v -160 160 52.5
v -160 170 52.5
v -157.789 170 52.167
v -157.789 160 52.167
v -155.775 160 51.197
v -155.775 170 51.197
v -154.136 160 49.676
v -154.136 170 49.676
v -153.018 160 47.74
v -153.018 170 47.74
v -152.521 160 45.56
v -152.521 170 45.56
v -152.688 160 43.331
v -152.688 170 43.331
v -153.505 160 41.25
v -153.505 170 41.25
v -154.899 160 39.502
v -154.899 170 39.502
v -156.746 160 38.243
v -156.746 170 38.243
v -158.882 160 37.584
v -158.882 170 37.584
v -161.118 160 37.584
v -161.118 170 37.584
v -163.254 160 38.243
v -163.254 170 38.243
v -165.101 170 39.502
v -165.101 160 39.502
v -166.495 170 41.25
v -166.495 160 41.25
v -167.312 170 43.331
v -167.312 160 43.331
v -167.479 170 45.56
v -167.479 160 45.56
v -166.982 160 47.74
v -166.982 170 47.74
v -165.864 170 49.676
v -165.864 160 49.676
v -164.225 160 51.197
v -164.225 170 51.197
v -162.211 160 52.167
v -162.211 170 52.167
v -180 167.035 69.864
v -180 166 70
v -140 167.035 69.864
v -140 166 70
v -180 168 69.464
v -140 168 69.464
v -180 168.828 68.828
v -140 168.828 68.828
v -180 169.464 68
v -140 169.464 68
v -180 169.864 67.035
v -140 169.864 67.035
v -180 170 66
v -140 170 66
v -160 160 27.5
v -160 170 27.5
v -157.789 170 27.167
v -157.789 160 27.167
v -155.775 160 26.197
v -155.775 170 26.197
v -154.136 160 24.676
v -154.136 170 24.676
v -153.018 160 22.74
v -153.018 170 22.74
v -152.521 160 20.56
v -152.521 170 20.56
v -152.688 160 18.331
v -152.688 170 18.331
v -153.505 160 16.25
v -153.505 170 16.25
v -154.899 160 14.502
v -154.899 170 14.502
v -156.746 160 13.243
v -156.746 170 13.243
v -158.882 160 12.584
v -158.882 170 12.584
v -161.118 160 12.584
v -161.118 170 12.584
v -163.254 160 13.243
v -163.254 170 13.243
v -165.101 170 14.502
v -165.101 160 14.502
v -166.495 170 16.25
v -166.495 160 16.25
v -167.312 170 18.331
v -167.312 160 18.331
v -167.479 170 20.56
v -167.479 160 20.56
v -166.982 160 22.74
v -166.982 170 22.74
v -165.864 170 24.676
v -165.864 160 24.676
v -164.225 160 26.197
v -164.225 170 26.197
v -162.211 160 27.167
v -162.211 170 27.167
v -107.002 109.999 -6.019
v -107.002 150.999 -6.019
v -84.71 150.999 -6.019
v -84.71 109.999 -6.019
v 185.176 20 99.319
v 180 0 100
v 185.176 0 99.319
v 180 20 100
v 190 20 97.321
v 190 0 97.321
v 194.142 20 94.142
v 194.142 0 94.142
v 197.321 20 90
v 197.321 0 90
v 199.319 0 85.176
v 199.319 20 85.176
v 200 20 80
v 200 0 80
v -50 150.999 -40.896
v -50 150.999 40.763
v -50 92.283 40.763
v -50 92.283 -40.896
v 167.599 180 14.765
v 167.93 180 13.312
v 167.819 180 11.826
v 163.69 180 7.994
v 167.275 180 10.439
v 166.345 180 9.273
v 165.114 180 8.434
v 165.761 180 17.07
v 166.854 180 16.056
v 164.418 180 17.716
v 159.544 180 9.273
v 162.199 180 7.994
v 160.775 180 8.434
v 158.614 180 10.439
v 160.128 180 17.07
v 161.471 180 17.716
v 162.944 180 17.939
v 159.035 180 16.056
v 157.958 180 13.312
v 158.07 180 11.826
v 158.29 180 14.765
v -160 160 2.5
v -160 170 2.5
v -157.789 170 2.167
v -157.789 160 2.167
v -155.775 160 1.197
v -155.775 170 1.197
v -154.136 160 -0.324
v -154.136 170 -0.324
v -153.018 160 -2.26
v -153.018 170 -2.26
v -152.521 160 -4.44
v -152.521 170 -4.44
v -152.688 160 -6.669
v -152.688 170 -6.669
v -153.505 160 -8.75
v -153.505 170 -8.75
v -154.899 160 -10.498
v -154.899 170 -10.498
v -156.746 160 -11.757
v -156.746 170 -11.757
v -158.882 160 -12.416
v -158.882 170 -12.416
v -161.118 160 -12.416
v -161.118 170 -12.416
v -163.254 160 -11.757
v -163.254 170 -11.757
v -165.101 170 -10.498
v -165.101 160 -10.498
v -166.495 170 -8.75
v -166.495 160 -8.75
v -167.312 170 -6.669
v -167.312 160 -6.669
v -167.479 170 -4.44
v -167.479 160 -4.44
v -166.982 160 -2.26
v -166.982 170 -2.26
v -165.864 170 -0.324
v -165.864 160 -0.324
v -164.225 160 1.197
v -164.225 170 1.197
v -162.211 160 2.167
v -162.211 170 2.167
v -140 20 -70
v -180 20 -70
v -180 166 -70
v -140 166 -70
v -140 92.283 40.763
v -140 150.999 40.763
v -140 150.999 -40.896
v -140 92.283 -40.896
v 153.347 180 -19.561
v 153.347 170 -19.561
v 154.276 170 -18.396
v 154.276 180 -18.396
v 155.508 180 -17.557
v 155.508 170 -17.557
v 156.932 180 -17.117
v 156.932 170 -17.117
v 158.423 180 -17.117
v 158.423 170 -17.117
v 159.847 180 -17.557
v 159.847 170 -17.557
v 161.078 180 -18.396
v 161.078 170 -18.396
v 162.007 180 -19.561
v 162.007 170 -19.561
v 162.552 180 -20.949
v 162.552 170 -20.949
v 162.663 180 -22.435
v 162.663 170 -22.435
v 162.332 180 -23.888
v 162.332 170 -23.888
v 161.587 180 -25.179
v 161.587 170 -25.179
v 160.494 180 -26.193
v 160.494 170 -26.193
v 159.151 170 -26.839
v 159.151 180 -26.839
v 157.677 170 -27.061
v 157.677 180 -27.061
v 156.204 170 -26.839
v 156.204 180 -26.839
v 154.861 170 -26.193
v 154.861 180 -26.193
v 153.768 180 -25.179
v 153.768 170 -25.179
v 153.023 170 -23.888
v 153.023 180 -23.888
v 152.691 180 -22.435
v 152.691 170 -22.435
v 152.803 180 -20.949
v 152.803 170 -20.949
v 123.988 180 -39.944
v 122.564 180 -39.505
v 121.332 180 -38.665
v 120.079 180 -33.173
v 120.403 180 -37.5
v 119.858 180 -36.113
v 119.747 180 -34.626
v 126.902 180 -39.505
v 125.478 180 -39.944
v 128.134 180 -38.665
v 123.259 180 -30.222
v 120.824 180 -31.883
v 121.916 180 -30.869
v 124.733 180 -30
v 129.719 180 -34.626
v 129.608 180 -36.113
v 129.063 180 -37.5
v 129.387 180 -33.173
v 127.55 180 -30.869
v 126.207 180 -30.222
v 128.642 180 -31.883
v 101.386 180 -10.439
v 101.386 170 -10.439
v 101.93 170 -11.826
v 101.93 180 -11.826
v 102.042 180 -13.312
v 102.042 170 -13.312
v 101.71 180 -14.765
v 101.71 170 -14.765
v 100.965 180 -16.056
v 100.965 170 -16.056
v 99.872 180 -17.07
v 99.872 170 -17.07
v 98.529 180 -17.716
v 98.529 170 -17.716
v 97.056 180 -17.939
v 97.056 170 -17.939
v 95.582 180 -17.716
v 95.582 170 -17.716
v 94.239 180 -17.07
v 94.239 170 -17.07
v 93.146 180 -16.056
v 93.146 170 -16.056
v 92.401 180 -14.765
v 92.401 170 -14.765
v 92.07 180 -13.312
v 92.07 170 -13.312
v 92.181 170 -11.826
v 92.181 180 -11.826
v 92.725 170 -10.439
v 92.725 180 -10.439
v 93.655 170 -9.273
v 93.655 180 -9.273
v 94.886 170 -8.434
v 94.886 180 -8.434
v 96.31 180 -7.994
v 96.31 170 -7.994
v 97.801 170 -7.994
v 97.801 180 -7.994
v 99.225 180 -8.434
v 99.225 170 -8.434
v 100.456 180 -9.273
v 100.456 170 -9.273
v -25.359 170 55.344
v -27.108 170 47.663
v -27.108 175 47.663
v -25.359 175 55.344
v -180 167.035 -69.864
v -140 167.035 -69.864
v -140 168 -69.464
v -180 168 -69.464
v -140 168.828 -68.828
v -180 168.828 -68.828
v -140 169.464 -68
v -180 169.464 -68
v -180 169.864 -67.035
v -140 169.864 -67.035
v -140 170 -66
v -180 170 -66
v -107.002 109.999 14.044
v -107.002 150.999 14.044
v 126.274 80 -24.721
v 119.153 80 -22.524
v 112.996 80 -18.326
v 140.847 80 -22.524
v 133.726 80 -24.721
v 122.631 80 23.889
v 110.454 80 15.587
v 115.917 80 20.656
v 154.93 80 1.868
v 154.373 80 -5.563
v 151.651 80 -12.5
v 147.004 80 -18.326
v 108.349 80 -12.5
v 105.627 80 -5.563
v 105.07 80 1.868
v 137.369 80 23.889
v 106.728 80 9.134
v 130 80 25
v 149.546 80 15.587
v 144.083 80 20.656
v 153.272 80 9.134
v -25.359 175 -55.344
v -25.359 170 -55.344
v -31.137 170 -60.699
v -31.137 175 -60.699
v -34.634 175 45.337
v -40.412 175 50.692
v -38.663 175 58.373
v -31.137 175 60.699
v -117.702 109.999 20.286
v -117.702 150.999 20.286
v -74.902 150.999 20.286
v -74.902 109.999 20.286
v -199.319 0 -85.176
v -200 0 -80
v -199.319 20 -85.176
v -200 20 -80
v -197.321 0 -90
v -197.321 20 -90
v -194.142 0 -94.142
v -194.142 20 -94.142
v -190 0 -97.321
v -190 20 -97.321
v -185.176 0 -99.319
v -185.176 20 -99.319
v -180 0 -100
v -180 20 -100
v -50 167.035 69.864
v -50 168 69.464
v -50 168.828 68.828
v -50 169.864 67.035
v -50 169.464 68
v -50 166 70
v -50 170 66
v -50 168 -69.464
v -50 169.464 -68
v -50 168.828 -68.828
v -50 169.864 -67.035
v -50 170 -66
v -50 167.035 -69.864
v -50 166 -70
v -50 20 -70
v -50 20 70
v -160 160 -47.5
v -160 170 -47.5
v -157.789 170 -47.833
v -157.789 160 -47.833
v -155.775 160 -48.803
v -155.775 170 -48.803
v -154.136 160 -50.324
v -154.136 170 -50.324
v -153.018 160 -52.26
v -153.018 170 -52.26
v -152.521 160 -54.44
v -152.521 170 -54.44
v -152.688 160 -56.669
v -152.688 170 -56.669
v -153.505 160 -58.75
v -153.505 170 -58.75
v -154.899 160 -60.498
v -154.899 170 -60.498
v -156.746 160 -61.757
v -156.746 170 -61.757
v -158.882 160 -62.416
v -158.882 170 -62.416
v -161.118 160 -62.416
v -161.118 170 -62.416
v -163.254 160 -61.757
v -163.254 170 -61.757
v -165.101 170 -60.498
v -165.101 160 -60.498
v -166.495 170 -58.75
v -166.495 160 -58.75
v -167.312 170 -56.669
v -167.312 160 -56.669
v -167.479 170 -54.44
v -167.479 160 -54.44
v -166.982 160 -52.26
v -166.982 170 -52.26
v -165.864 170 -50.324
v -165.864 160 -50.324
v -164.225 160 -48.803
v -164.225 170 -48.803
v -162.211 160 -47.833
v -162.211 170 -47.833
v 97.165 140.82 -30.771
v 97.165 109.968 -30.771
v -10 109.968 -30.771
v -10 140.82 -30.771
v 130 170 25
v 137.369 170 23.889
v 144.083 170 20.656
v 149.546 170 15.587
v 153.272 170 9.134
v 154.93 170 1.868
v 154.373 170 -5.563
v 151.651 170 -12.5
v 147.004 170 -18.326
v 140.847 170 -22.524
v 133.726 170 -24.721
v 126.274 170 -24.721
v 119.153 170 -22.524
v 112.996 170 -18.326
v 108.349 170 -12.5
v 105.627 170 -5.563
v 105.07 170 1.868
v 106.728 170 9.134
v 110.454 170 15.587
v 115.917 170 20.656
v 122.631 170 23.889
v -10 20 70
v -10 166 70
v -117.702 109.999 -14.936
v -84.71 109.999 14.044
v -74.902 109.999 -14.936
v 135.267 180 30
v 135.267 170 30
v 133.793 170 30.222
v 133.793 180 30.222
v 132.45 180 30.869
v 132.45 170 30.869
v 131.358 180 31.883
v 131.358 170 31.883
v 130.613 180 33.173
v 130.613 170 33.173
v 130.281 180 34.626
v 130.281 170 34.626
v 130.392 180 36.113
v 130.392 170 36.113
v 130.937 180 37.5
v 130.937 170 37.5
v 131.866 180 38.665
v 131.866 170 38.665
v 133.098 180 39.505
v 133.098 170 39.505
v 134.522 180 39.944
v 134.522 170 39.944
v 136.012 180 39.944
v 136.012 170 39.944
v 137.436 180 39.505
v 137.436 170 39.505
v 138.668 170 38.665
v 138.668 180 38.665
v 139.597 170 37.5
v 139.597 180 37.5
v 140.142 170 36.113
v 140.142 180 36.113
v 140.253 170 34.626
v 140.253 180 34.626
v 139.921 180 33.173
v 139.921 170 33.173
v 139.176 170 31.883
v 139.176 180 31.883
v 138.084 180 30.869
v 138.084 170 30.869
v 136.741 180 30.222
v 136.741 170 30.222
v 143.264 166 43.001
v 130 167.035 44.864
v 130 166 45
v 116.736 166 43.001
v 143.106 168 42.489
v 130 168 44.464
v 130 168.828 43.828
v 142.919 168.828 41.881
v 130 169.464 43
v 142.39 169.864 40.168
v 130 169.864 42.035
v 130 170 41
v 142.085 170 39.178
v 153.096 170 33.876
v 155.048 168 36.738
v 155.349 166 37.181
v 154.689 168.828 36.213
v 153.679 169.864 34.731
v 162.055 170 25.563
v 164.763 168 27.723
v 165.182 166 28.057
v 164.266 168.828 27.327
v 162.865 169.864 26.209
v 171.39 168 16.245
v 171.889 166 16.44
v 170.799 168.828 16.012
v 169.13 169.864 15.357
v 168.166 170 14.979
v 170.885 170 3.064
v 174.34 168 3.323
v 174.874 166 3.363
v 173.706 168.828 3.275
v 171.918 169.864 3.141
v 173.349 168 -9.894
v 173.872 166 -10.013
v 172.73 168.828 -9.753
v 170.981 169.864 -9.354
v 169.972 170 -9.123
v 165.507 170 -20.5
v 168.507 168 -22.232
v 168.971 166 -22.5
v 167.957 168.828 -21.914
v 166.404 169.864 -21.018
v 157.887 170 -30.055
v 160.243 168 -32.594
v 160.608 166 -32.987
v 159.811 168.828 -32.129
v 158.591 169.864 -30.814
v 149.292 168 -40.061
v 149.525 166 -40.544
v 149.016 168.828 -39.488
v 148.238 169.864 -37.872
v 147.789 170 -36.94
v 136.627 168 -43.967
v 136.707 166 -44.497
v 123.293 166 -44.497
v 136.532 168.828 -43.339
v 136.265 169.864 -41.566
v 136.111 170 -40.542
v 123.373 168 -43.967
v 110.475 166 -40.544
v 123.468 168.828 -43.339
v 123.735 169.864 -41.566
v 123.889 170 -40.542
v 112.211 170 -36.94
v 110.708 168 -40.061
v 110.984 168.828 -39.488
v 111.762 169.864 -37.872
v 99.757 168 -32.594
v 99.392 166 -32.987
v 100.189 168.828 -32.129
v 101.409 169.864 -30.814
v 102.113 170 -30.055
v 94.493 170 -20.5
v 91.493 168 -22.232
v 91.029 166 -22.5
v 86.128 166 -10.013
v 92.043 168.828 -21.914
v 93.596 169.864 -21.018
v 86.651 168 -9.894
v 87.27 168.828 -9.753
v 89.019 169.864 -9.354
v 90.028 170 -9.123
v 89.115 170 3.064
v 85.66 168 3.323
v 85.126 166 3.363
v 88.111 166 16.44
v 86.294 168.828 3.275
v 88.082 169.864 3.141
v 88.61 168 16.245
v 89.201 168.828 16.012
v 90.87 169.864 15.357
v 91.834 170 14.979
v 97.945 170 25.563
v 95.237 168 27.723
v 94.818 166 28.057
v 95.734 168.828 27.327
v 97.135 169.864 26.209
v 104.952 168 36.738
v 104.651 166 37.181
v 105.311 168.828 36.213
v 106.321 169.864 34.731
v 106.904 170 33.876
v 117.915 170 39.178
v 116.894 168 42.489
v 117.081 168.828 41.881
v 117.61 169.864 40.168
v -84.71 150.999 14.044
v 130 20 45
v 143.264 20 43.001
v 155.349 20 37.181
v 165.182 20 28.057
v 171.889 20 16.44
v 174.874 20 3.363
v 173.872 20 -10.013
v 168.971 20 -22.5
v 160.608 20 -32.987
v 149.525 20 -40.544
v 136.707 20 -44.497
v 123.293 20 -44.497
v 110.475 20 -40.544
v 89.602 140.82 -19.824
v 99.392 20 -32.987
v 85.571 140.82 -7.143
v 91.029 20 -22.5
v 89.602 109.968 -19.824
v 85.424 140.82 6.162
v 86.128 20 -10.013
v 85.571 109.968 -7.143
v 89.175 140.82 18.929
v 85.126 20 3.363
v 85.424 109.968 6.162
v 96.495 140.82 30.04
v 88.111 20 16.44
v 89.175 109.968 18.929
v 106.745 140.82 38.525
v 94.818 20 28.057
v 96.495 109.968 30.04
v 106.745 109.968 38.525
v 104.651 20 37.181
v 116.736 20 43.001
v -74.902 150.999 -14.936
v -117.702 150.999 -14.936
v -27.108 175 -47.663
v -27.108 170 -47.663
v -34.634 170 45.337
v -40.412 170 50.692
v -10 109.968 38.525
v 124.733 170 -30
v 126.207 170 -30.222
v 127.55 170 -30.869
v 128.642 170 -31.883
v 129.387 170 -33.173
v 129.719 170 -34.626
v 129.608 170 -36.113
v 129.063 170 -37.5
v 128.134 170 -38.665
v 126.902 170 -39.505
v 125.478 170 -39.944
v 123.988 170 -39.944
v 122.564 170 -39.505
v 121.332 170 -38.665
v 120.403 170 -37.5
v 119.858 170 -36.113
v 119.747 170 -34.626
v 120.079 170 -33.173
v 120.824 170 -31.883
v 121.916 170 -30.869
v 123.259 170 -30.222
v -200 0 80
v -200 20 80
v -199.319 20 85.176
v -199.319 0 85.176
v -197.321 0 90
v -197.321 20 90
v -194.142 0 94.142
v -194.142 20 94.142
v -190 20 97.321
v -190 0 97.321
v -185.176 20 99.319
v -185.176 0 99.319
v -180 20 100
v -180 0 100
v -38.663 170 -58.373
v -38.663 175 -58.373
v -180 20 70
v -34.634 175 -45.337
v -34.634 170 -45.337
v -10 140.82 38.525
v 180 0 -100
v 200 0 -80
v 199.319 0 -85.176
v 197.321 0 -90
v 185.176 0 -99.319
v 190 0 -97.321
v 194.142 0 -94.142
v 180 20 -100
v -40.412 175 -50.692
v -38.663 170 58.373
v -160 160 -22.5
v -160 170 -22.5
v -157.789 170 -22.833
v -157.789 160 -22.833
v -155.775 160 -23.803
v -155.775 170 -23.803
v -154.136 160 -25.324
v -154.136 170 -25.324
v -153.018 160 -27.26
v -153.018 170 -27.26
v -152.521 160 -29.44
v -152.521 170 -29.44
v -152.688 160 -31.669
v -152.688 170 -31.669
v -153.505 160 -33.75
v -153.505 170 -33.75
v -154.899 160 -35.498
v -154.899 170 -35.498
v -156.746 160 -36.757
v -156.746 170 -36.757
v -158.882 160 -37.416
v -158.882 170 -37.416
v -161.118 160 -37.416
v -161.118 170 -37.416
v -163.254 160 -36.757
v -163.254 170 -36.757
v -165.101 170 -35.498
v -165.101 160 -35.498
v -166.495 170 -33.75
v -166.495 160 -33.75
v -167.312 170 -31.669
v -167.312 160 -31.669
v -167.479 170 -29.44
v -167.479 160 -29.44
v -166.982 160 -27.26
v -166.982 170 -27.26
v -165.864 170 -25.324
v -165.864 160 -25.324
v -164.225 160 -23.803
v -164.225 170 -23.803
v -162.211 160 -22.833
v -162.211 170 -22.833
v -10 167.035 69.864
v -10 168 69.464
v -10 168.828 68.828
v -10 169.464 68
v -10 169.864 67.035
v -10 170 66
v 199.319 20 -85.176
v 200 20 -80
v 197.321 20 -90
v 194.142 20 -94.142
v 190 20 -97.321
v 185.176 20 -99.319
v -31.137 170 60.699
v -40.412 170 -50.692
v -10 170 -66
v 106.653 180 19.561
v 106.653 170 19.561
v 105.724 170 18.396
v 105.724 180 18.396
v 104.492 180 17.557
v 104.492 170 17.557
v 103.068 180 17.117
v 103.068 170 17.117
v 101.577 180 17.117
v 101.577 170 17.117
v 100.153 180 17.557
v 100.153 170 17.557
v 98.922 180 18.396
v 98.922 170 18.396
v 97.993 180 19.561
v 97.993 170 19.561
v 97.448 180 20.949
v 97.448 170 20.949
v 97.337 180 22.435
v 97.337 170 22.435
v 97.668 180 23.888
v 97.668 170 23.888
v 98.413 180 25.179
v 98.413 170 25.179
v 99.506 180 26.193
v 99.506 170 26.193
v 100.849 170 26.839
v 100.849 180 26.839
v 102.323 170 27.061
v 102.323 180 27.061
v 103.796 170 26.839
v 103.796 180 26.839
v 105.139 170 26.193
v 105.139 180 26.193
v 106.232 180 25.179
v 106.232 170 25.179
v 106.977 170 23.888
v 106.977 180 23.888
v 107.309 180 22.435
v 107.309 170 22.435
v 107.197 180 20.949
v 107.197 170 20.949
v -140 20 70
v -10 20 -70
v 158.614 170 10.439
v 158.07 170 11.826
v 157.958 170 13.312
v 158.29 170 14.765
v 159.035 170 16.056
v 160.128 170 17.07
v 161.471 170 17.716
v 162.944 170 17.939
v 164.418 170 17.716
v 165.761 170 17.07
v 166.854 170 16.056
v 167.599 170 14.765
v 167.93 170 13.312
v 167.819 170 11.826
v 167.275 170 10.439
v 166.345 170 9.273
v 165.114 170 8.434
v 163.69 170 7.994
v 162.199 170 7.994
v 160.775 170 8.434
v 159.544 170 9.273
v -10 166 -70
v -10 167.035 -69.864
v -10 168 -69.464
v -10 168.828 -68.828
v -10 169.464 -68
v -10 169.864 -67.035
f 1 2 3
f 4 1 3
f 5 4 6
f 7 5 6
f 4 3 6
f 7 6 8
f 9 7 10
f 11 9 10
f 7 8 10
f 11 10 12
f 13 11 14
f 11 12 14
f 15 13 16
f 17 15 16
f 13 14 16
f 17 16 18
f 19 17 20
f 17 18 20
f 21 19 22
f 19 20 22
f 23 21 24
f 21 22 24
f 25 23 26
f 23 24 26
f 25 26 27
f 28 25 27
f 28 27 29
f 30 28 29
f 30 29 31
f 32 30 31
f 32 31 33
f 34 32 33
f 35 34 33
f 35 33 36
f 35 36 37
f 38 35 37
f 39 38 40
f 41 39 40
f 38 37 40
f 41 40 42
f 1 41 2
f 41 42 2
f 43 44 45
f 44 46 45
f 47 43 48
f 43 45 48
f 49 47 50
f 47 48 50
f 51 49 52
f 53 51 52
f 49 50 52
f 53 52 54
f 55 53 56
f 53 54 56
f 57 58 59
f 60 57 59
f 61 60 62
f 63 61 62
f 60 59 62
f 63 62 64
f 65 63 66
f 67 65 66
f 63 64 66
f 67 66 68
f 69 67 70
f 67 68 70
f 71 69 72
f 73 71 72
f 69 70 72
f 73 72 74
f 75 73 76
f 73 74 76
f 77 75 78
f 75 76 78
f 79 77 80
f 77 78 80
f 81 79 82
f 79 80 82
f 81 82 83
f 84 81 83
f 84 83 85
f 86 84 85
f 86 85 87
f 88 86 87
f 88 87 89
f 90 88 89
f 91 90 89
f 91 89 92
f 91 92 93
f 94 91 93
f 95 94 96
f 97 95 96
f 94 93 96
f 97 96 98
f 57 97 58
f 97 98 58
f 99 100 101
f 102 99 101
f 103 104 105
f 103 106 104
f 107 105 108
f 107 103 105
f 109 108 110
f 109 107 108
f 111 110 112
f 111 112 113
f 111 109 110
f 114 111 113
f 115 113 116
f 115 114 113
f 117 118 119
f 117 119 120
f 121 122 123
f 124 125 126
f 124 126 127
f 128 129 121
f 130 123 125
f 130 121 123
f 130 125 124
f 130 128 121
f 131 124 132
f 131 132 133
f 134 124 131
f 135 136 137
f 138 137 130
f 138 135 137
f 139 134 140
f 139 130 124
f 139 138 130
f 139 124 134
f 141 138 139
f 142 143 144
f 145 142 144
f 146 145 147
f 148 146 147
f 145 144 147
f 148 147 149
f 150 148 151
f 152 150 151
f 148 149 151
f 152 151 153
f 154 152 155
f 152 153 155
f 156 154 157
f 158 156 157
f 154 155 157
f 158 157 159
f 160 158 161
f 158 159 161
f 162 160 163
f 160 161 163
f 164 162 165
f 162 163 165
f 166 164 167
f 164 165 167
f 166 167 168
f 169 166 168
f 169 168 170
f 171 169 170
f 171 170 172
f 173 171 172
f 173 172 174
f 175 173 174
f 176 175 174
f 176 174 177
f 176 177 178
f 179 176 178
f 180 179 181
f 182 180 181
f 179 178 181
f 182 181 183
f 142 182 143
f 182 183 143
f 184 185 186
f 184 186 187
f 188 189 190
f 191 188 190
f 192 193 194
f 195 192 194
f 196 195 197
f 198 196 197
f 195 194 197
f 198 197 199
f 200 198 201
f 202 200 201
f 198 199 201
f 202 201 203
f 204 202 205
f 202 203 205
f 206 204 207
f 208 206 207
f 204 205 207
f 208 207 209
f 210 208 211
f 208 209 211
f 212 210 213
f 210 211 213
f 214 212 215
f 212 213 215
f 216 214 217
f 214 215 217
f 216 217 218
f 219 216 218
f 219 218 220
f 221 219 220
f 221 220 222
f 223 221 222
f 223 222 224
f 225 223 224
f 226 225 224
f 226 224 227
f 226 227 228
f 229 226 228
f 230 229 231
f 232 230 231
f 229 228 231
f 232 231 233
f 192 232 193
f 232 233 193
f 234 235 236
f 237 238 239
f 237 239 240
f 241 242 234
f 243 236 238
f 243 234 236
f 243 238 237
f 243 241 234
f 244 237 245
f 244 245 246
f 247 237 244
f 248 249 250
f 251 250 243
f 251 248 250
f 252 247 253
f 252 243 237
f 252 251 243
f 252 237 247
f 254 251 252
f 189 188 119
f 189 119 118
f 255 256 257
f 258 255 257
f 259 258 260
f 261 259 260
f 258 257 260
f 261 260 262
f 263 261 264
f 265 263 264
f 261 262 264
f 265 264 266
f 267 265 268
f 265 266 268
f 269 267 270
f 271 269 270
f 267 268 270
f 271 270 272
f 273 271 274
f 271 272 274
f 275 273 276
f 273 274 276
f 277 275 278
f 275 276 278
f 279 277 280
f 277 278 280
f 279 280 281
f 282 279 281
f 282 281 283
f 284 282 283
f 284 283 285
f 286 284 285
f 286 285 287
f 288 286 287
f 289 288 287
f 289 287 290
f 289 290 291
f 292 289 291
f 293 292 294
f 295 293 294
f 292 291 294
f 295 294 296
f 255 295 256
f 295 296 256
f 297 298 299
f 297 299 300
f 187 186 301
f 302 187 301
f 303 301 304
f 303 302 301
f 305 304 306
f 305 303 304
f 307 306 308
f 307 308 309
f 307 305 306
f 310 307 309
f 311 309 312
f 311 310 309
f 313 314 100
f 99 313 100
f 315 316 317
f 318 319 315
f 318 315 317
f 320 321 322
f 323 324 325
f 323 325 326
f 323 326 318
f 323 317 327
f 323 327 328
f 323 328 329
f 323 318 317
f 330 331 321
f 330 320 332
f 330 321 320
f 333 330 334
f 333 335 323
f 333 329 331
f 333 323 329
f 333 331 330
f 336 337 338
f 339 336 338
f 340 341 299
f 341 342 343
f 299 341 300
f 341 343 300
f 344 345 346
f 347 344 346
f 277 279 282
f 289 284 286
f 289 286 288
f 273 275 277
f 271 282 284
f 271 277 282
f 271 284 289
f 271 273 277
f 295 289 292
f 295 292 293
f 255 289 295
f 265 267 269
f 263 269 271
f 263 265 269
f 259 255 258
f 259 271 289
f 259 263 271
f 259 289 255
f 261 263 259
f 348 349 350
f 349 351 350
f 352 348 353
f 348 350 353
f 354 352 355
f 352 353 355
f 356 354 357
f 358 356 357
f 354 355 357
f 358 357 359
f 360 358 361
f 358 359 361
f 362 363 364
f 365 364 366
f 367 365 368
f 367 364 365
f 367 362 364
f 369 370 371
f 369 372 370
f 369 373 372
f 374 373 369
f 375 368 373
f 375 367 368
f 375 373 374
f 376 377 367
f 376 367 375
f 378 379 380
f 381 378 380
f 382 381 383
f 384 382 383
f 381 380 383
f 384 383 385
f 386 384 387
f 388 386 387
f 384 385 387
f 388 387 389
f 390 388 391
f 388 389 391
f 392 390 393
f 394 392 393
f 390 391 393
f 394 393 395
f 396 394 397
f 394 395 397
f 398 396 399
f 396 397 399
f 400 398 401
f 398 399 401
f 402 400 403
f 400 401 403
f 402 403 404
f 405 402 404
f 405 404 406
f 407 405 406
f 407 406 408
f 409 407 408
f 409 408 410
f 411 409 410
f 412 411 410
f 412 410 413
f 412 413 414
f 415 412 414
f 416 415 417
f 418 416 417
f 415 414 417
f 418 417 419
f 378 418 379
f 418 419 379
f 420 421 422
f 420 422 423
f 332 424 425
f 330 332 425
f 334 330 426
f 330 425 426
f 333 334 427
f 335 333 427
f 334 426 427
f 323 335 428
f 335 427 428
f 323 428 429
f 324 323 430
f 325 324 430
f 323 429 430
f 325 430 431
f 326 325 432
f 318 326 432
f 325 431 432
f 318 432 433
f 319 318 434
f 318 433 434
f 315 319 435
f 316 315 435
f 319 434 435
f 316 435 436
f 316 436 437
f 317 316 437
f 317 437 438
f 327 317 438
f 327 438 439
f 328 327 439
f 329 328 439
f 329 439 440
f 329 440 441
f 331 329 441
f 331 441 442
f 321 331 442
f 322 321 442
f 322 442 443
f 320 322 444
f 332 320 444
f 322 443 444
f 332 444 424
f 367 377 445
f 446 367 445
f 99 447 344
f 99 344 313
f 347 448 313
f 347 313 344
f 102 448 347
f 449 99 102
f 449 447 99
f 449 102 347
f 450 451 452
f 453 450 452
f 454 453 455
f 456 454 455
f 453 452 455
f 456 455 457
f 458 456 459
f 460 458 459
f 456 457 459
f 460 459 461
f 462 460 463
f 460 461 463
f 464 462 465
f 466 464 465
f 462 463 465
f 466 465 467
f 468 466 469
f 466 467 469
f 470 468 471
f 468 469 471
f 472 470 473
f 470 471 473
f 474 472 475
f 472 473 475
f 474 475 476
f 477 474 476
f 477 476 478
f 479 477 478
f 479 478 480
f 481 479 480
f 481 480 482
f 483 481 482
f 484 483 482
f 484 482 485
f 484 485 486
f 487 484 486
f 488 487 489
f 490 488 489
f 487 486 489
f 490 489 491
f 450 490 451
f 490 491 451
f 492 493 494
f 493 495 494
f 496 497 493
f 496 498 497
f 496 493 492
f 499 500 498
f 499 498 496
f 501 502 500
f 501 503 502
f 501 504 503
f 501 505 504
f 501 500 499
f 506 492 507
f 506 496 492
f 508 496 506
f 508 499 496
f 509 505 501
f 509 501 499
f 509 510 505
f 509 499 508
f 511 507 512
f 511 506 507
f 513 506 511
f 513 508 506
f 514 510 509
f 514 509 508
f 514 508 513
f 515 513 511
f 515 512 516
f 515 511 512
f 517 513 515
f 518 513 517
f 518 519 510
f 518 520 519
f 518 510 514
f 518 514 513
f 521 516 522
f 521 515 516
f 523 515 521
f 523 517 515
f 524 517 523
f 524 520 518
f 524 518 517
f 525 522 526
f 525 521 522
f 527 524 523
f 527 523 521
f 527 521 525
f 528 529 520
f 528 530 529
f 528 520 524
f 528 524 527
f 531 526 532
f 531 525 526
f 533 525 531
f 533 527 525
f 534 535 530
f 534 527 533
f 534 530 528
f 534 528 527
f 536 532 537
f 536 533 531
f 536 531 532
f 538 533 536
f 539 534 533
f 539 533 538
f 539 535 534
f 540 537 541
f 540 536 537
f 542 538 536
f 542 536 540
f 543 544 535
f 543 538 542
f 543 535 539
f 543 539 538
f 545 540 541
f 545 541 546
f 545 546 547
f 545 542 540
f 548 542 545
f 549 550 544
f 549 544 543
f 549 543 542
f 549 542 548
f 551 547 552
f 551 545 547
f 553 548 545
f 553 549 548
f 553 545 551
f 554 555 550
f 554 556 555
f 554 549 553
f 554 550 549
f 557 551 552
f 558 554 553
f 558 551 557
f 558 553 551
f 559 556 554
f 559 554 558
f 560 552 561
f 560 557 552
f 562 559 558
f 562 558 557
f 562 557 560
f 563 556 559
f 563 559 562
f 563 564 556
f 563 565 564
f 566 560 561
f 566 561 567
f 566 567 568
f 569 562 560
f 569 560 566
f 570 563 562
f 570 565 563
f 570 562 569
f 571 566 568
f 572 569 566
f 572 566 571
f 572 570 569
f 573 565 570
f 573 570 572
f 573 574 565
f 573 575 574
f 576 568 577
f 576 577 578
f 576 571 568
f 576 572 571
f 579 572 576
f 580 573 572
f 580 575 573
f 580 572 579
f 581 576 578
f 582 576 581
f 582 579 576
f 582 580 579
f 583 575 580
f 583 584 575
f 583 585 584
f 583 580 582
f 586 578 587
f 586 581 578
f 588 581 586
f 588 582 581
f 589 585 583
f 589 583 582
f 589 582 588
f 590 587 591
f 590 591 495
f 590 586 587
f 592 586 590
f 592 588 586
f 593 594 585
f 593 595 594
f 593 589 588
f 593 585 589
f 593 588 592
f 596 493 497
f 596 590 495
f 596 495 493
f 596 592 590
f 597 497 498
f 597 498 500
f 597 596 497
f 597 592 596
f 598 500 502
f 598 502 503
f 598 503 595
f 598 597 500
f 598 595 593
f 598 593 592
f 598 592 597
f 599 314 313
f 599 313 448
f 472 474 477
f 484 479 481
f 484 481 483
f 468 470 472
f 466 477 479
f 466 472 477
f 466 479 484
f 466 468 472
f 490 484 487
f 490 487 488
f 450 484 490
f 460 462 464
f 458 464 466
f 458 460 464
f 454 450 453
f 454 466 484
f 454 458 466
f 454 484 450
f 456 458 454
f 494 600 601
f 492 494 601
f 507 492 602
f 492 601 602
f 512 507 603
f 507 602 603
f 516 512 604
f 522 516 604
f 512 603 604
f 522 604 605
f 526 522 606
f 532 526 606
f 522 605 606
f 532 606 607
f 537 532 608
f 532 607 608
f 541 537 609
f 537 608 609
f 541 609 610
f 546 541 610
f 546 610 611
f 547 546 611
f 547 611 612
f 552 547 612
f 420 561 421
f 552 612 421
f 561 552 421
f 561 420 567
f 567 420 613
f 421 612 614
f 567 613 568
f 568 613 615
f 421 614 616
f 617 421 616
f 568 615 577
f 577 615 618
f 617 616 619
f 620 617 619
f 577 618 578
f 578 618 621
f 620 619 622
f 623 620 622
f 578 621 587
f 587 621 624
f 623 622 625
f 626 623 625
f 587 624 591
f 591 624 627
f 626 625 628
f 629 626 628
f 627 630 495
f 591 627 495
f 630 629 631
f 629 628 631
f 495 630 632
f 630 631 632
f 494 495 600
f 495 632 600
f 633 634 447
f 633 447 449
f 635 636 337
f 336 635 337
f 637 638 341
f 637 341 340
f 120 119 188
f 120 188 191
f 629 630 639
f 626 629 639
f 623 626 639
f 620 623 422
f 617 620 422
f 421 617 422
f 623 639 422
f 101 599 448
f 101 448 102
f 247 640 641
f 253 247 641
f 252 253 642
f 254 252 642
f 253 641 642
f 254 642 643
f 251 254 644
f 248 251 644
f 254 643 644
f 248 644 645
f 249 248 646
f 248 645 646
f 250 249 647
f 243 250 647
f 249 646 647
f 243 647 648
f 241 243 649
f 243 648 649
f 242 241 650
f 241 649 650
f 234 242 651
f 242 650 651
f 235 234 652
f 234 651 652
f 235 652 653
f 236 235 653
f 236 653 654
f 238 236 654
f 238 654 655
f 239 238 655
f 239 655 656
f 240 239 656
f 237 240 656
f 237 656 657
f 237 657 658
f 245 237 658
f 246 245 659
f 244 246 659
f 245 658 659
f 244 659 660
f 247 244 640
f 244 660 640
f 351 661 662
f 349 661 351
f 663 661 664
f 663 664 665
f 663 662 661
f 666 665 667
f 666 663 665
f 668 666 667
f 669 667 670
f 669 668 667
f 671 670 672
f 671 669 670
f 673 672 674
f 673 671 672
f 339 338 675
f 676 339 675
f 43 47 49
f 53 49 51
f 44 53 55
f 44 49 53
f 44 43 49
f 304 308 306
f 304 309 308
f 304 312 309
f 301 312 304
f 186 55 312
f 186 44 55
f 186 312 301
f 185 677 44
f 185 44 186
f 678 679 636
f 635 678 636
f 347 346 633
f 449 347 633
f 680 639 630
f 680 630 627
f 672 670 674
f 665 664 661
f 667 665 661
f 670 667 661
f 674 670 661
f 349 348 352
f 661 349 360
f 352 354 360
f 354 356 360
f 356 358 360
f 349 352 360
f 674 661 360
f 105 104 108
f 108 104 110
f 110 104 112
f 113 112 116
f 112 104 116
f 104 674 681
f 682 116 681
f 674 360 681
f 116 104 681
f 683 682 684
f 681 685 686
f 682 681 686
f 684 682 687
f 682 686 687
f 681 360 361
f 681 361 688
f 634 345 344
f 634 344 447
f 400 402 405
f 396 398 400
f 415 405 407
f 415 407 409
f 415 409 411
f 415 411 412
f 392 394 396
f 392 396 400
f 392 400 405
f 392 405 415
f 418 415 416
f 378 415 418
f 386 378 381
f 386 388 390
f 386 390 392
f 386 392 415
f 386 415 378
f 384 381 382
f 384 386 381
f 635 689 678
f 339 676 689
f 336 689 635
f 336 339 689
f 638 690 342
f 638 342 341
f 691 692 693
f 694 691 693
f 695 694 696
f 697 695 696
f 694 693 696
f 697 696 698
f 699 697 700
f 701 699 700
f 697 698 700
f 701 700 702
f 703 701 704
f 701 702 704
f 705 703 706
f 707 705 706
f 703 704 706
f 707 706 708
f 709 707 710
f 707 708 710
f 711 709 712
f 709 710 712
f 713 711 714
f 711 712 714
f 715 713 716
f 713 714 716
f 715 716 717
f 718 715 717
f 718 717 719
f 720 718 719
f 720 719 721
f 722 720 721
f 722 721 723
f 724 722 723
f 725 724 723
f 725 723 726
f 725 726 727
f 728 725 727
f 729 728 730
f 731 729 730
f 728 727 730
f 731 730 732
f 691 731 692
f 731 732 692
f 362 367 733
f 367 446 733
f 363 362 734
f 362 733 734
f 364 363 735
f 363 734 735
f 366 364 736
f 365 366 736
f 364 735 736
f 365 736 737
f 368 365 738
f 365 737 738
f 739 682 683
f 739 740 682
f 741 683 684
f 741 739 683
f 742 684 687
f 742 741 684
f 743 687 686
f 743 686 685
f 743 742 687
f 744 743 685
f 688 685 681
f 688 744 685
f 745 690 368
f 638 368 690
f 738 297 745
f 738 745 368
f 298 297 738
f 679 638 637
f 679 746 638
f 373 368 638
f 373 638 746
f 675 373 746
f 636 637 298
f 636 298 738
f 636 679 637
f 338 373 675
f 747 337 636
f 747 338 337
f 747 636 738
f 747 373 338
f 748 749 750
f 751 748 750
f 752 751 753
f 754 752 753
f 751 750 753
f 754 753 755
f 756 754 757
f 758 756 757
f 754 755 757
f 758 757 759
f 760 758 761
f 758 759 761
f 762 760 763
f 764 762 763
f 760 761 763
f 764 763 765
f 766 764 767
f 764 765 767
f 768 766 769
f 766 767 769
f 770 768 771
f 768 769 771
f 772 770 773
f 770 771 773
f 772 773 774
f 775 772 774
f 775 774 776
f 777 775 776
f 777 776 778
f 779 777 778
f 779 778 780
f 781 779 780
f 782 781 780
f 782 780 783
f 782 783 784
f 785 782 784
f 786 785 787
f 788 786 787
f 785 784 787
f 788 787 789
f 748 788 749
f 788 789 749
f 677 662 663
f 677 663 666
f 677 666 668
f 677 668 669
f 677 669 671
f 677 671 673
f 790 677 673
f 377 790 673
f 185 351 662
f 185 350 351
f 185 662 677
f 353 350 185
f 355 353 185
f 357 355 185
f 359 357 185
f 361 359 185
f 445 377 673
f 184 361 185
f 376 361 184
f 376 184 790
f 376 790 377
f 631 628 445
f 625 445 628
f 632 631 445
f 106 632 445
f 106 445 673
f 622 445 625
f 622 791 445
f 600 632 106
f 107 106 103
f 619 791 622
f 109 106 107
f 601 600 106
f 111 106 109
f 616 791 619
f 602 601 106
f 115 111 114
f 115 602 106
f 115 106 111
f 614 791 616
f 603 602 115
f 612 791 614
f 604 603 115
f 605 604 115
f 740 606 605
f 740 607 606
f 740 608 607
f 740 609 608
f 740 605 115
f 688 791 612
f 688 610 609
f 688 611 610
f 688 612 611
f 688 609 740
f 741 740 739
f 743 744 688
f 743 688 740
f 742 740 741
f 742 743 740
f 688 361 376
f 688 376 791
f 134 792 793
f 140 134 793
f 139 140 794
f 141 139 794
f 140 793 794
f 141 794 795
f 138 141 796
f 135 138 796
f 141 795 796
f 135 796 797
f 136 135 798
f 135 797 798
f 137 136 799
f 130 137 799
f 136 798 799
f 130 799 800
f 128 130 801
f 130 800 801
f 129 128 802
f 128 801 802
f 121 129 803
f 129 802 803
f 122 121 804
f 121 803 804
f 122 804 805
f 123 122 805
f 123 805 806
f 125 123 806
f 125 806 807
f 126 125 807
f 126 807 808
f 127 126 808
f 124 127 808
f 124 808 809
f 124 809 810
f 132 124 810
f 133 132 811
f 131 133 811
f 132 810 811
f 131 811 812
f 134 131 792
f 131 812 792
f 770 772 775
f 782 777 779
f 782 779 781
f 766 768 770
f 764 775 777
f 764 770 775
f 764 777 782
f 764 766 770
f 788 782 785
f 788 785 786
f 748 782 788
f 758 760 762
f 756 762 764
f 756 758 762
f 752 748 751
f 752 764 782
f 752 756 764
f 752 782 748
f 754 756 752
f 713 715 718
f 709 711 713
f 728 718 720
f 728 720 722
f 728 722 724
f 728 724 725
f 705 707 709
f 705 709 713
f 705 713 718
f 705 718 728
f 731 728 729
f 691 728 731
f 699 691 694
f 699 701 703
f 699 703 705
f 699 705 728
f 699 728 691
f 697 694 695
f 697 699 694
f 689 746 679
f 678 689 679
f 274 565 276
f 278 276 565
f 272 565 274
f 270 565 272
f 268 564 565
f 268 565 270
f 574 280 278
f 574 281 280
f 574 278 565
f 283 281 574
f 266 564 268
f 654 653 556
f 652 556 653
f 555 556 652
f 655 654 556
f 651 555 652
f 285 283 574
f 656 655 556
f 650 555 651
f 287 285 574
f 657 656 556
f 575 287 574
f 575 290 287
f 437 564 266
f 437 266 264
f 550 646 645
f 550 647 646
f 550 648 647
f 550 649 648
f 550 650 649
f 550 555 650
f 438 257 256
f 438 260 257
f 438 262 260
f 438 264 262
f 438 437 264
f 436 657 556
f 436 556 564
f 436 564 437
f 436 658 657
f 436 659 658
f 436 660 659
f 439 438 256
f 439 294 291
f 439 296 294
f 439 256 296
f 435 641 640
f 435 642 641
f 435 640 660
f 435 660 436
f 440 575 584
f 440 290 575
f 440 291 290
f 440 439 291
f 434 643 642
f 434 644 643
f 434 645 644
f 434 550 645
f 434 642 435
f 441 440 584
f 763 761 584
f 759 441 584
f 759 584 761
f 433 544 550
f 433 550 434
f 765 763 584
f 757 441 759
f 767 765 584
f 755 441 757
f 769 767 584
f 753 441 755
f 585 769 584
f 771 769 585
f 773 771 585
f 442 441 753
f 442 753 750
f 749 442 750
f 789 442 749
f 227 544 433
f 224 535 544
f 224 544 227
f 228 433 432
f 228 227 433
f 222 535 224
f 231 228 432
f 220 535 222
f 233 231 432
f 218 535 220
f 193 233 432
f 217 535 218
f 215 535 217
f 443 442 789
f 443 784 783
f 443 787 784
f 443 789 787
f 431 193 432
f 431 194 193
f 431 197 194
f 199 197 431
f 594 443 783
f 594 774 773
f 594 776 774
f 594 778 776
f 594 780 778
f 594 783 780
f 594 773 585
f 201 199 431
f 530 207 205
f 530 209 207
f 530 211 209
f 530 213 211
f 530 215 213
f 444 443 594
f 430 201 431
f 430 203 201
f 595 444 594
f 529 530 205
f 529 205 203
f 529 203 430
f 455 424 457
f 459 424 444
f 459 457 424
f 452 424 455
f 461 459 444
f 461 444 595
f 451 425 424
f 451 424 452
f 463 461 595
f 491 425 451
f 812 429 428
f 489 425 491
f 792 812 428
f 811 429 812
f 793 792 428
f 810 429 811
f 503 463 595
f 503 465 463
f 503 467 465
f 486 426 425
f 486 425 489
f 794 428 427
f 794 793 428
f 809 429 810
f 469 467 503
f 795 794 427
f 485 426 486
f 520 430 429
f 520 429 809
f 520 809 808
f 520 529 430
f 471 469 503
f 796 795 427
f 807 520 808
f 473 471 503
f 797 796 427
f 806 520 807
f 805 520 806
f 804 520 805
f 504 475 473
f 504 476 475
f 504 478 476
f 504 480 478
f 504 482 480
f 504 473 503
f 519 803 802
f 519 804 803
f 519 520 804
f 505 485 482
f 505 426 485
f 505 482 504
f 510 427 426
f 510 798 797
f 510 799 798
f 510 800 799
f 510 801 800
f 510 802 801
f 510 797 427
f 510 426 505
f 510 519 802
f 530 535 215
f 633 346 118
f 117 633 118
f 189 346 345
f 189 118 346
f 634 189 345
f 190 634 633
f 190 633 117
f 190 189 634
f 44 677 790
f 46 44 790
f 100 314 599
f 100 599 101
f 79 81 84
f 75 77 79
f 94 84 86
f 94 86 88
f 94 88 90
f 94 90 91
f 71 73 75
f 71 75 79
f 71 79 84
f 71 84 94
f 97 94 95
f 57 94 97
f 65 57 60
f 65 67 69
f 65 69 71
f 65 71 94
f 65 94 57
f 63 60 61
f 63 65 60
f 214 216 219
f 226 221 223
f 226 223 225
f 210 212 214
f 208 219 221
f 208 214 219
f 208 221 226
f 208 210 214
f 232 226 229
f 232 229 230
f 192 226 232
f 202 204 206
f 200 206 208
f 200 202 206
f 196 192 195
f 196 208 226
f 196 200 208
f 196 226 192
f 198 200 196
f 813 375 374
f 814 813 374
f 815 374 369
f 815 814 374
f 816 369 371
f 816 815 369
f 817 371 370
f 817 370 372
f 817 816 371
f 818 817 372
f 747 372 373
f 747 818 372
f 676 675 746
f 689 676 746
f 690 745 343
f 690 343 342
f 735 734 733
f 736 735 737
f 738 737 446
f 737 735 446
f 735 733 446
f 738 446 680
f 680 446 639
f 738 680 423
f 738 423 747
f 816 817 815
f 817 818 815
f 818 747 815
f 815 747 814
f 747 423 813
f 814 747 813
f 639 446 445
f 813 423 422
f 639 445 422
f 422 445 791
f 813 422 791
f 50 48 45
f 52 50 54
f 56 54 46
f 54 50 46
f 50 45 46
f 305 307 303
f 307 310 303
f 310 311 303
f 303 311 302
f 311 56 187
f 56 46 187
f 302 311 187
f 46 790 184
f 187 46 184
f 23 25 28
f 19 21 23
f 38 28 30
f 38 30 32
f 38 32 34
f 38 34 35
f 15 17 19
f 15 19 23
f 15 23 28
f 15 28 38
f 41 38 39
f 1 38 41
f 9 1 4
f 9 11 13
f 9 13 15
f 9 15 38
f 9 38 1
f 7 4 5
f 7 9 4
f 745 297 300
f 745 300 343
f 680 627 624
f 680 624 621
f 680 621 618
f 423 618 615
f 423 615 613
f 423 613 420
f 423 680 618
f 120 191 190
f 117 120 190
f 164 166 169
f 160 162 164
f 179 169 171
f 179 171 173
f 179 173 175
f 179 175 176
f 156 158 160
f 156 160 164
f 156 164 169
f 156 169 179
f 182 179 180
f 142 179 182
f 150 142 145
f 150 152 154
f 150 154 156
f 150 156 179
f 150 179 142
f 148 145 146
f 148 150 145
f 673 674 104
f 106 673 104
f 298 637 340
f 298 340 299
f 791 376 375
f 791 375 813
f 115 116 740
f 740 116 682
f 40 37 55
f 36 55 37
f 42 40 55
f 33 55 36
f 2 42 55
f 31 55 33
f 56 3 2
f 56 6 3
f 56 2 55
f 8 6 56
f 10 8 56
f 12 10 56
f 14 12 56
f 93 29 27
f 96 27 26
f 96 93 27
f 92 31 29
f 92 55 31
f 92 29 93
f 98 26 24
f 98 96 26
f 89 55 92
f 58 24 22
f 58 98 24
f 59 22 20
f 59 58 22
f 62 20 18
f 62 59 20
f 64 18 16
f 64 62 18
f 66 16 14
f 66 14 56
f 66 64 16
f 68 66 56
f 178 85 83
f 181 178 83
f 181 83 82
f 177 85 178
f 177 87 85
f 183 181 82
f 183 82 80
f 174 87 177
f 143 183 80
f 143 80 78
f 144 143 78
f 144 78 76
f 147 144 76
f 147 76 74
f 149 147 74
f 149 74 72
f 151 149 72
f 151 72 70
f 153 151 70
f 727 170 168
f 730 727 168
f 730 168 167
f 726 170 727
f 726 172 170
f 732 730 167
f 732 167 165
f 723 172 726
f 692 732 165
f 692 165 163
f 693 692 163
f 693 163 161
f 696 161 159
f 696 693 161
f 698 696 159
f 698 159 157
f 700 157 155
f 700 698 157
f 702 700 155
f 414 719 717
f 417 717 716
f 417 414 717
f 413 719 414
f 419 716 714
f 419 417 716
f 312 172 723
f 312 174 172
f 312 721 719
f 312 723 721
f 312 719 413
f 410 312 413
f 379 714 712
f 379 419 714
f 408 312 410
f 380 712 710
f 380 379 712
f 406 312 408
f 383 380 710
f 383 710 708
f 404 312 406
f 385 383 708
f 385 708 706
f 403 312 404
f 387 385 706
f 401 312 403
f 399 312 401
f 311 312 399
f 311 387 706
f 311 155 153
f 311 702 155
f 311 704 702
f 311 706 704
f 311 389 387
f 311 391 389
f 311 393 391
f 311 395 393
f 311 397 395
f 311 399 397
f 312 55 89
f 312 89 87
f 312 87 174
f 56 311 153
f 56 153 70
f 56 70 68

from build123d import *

# Parameters (mm, degrees)
ESBO_O2_W                     = 400
ESBO_O2_H                     = 200
RESSALTO_EXTRUS_O1_DEPTH      = 20
FILETE4_R                     = 20
ESBO_O4_R                     = 45
ESBO_O4_W                     = 40
ESBO_O4_H                     = 140
RESSALTO_EXTRUS_O4_DEPTH      = 150
ESBO_O5_W                     = 81.658803593
ESBO_O5_H                     = 58.716236851
RESSALTO_EXTRUS_O5_DEPTH      = 90
RESSALTO_EXTRUS_O6_REACH      = 290.097
RESSALTO_EXTRUS_O6_END_RADIUS = 45
ESBO_O6_W                     = 69.29625837
ESBO_O6_H                     = 30.851919202
ESBO_O8_R                     = 5
RESSALTO_EXTRUS_O8_DEPTH      = 10
PADR_OCIRCULAR2_COUNT         = 6
FILETE6_R                     = 4
RESSALTO_EXTRUS_O9_DEPTH      = 5
ESBO_O12_R                    = 25
CORTE_EXTRUS_O1_DEPTH         = 90
ESBO_O13_W                    = 42.800869612
ESBO_O13_H                    = 35.221548951
ESBO_O13_W_2                  = 22.29211959
ESBO_O13_H_2                  = 20.06290763
CORTE_EXTRUS_O2_DEPTH         = 41
ESBO_O7_R                     = 7.5
CORTE_EXTRUS_O3_DEPTH         = 10
PADR_O_LINEAR1_COUNT          = 5
PADR_O_LINEAR1_PITCH          = 25


with BuildPart() as part:
    # Esboço2 → Ressalto-extrusão1 (new body)
    with BuildSketch(Plane(origin=(0, 0, 0), x_dir=(1, 0, 0), z_dir=(0, 1, 0))):
        Rectangle(ESBO_O2_W, ESBO_O2_H)
    extrude(amount=RESSALTO_EXTRUS_O1_DEPTH)

    # Filete4
    filete4_edges = [part.edges().sort_by_distance(p)[0] for p in [
        (200, 10, 100),
        (200, 10, -100),
        (-200, 10, -100),
        (-200, 10, 100),
    ]]
    fillet(filete4_edges, radius=FILETE4_R)

    # Esboço4 → Ressalto-extrusão4 (add)
    with BuildSketch(Plane(origin=(0, 20, 0), x_dir=(1, 0, 0), z_dir=(0, 1, 0))):
        with Locations(Location((130, 0, 0), (0, 0, 270))):
            Circle(ESBO_O4_R)
        with Locations((-160, 0)):
            Rectangle(ESBO_O4_W, ESBO_O4_H)
        with Locations((-30, 0)):
            Rectangle(ESBO_O4_W, ESBO_O4_H)
    extrude(amount=RESSALTO_EXTRUS_O4_DEPTH)

    # Ressalto-extrusão6: up to this cylinder (the profile starts outside it)
    ressalto_extrus_o6_end = Plane(origin=(130, 125.393831, 0), z_dir=(0, -1, 0)) * Cylinder(RESSALTO_EXTRUS_O6_END_RADIUS, 671.194, mode=Mode.PRIVATE)
    # Esboço6 → Ressalto-extrusão6 (add, up to the surface)
    with BuildSketch(Plane(origin=(-10, 0, 0), x_dir=(0, 0, -1), z_dir=(1, 0, 0)), mode=Mode.PRIVATE) as ressalto_extrus_o6_sk1:
        with Locations((-3.877016652, 125.393831311)):
            Rectangle(ESBO_O6_W, ESBO_O6_H)
    ressalto_extrus_o6_tool1 = extrude(ressalto_extrus_o6_sk1.sketch, amount=RESSALTO_EXTRUS_O6_REACH, mode=Mode.PRIVATE) - ressalto_extrus_o6_end
    add(ressalto_extrus_o6_tool1.solids().sort_by_distance((-10, 125.393831, 3.877017))[0])

    # Esboço8 → Ressalto-extrusão8 (add)
    with BuildSketch(Plane(origin=(0, 170, 0), x_dir=(1, 0, 0), z_dir=(0, 1, 0))):
        with Locations(Location((124.732936709, 35, 0), (0, 0, 270))):
            Circle(ESBO_O8_R)
    ressalto_extrus_o8 = extrude(amount=RESSALTO_EXTRUS_O8_DEPTH)

    # PadrãoCircular2: Ressalto-extrusão8 ×6 about axis
    padr_ocircular2_axis = Axis((130, 0, 0), (0, 1, 0))
    for i in range(1, PADR_OCIRCULAR2_COUNT):
        add(ressalto_extrus_o8.rotate(padr_ocircular2_axis, i * 360 / PADR_OCIRCULAR2_COUNT))

    # Filete6
    filete6_edges = [part.edges().sort_by_distance(p)[0] for p in [
        (-160, 170, 70),
        (-160, 170, -70),
        (-30, 170, 70),
        (-30, 170, -70),
        (130, 170, -45),
    ]]
    fillet(filete6_edges, radius=FILETE6_R)

    # Esboço9 → Ressalto-extrusão9 (add)
    with BuildSketch(Plane(origin=(0, 170, 0), x_dir=(1, 0, 0), z_dir=(0, 1, 0))):
        Polygon((-27.108026111, 47.663480137), (-25.359402405, 55.344402951), (-31.136964834, 60.69921691), (-38.663150969, 58.373108054), (-40.411774675, 50.692185239), (-34.634212246, 45.33737128), align=None)
    ressalto_extrus_o9 = extrude(amount=RESSALTO_EXTRUS_O9_DEPTH)

    # Espelhar1: Ressalto-extrusão9 across plane
    add(ressalto_extrus_o9.mirror(Plane(origin=(0, 0, 0), x_dir=(1, 0, 0), z_dir=(0, 0, -1))))

    # Esboço12 → Corte-extrusão1 (cut)
    with BuildSketch(Plane(origin=(0, 170, 0), x_dir=(1, 0, 0), z_dir=(0, 1, 0))):
        with Locations(Location((130, 0, 0), (0, 0, 270))):
            Circle(ESBO_O12_R)
    extrude(amount=-CORTE_EXTRUS_O1_DEPTH, mode=Mode.SUBTRACT)

    # Esboço7 → Corte-extrusão3 (cut)
    with BuildSketch(Plane(origin=(0, 170, 0), x_dir=(1, 0, 0), z_dir=(0, 1, 0))):
        with Locations(Location((-160, 55, 0), (0, 0, 270))):
            Circle(ESBO_O7_R)
    corte_extrus_o3 = extrude(amount=-CORTE_EXTRUS_O3_DEPTH, mode=Mode.SUBTRACT)

    # Padrão linear1: Corte-extrusão3 ×5
    with Locations(*[(0, 0, i * PADR_O_LINEAR1_PITCH) for i in range(1, PADR_O_LINEAR1_COUNT)]):
        add(corte_extrus_o3, mode=Mode.SUBTRACT)


with BuildPart() as body_2:
    # Esboço5 → Ressalto-extrusão5 (new body)
    with BuildSketch(Plane(origin=(-140, 0, 0), x_dir=(0, 0, -1), z_dir=(1, 0, 0))):
        with Locations((0.066363841, 121.641358838)):
            Rectangle(ESBO_O5_W, ESBO_O5_H)
    extrude(amount=RESSALTO_EXTRUS_O5_DEPTH)

    # Esboço13 → Corte-extrusão2 (cut)
    with BuildSketch(Plane(origin=(0, 150.999477263, 0), x_dir=(1, 0, 0), z_dir=(0, 1, 0))):
        with Locations((-96.301956627, -2.675054351)):
            Rectangle(ESBO_O13_W, ESBO_O13_H)
        with Locations((-95.856114235, -4.012581526)):
            Rectangle(ESBO_O13_W_2, ESBO_O13_H_2, mode=Mode.SUBTRACT)
    extrude(amount=-CORTE_EXTRUS_O2_DEPTH, mode=Mode.SUBTRACT)


solid = Compound([part.part, body_2.part])
